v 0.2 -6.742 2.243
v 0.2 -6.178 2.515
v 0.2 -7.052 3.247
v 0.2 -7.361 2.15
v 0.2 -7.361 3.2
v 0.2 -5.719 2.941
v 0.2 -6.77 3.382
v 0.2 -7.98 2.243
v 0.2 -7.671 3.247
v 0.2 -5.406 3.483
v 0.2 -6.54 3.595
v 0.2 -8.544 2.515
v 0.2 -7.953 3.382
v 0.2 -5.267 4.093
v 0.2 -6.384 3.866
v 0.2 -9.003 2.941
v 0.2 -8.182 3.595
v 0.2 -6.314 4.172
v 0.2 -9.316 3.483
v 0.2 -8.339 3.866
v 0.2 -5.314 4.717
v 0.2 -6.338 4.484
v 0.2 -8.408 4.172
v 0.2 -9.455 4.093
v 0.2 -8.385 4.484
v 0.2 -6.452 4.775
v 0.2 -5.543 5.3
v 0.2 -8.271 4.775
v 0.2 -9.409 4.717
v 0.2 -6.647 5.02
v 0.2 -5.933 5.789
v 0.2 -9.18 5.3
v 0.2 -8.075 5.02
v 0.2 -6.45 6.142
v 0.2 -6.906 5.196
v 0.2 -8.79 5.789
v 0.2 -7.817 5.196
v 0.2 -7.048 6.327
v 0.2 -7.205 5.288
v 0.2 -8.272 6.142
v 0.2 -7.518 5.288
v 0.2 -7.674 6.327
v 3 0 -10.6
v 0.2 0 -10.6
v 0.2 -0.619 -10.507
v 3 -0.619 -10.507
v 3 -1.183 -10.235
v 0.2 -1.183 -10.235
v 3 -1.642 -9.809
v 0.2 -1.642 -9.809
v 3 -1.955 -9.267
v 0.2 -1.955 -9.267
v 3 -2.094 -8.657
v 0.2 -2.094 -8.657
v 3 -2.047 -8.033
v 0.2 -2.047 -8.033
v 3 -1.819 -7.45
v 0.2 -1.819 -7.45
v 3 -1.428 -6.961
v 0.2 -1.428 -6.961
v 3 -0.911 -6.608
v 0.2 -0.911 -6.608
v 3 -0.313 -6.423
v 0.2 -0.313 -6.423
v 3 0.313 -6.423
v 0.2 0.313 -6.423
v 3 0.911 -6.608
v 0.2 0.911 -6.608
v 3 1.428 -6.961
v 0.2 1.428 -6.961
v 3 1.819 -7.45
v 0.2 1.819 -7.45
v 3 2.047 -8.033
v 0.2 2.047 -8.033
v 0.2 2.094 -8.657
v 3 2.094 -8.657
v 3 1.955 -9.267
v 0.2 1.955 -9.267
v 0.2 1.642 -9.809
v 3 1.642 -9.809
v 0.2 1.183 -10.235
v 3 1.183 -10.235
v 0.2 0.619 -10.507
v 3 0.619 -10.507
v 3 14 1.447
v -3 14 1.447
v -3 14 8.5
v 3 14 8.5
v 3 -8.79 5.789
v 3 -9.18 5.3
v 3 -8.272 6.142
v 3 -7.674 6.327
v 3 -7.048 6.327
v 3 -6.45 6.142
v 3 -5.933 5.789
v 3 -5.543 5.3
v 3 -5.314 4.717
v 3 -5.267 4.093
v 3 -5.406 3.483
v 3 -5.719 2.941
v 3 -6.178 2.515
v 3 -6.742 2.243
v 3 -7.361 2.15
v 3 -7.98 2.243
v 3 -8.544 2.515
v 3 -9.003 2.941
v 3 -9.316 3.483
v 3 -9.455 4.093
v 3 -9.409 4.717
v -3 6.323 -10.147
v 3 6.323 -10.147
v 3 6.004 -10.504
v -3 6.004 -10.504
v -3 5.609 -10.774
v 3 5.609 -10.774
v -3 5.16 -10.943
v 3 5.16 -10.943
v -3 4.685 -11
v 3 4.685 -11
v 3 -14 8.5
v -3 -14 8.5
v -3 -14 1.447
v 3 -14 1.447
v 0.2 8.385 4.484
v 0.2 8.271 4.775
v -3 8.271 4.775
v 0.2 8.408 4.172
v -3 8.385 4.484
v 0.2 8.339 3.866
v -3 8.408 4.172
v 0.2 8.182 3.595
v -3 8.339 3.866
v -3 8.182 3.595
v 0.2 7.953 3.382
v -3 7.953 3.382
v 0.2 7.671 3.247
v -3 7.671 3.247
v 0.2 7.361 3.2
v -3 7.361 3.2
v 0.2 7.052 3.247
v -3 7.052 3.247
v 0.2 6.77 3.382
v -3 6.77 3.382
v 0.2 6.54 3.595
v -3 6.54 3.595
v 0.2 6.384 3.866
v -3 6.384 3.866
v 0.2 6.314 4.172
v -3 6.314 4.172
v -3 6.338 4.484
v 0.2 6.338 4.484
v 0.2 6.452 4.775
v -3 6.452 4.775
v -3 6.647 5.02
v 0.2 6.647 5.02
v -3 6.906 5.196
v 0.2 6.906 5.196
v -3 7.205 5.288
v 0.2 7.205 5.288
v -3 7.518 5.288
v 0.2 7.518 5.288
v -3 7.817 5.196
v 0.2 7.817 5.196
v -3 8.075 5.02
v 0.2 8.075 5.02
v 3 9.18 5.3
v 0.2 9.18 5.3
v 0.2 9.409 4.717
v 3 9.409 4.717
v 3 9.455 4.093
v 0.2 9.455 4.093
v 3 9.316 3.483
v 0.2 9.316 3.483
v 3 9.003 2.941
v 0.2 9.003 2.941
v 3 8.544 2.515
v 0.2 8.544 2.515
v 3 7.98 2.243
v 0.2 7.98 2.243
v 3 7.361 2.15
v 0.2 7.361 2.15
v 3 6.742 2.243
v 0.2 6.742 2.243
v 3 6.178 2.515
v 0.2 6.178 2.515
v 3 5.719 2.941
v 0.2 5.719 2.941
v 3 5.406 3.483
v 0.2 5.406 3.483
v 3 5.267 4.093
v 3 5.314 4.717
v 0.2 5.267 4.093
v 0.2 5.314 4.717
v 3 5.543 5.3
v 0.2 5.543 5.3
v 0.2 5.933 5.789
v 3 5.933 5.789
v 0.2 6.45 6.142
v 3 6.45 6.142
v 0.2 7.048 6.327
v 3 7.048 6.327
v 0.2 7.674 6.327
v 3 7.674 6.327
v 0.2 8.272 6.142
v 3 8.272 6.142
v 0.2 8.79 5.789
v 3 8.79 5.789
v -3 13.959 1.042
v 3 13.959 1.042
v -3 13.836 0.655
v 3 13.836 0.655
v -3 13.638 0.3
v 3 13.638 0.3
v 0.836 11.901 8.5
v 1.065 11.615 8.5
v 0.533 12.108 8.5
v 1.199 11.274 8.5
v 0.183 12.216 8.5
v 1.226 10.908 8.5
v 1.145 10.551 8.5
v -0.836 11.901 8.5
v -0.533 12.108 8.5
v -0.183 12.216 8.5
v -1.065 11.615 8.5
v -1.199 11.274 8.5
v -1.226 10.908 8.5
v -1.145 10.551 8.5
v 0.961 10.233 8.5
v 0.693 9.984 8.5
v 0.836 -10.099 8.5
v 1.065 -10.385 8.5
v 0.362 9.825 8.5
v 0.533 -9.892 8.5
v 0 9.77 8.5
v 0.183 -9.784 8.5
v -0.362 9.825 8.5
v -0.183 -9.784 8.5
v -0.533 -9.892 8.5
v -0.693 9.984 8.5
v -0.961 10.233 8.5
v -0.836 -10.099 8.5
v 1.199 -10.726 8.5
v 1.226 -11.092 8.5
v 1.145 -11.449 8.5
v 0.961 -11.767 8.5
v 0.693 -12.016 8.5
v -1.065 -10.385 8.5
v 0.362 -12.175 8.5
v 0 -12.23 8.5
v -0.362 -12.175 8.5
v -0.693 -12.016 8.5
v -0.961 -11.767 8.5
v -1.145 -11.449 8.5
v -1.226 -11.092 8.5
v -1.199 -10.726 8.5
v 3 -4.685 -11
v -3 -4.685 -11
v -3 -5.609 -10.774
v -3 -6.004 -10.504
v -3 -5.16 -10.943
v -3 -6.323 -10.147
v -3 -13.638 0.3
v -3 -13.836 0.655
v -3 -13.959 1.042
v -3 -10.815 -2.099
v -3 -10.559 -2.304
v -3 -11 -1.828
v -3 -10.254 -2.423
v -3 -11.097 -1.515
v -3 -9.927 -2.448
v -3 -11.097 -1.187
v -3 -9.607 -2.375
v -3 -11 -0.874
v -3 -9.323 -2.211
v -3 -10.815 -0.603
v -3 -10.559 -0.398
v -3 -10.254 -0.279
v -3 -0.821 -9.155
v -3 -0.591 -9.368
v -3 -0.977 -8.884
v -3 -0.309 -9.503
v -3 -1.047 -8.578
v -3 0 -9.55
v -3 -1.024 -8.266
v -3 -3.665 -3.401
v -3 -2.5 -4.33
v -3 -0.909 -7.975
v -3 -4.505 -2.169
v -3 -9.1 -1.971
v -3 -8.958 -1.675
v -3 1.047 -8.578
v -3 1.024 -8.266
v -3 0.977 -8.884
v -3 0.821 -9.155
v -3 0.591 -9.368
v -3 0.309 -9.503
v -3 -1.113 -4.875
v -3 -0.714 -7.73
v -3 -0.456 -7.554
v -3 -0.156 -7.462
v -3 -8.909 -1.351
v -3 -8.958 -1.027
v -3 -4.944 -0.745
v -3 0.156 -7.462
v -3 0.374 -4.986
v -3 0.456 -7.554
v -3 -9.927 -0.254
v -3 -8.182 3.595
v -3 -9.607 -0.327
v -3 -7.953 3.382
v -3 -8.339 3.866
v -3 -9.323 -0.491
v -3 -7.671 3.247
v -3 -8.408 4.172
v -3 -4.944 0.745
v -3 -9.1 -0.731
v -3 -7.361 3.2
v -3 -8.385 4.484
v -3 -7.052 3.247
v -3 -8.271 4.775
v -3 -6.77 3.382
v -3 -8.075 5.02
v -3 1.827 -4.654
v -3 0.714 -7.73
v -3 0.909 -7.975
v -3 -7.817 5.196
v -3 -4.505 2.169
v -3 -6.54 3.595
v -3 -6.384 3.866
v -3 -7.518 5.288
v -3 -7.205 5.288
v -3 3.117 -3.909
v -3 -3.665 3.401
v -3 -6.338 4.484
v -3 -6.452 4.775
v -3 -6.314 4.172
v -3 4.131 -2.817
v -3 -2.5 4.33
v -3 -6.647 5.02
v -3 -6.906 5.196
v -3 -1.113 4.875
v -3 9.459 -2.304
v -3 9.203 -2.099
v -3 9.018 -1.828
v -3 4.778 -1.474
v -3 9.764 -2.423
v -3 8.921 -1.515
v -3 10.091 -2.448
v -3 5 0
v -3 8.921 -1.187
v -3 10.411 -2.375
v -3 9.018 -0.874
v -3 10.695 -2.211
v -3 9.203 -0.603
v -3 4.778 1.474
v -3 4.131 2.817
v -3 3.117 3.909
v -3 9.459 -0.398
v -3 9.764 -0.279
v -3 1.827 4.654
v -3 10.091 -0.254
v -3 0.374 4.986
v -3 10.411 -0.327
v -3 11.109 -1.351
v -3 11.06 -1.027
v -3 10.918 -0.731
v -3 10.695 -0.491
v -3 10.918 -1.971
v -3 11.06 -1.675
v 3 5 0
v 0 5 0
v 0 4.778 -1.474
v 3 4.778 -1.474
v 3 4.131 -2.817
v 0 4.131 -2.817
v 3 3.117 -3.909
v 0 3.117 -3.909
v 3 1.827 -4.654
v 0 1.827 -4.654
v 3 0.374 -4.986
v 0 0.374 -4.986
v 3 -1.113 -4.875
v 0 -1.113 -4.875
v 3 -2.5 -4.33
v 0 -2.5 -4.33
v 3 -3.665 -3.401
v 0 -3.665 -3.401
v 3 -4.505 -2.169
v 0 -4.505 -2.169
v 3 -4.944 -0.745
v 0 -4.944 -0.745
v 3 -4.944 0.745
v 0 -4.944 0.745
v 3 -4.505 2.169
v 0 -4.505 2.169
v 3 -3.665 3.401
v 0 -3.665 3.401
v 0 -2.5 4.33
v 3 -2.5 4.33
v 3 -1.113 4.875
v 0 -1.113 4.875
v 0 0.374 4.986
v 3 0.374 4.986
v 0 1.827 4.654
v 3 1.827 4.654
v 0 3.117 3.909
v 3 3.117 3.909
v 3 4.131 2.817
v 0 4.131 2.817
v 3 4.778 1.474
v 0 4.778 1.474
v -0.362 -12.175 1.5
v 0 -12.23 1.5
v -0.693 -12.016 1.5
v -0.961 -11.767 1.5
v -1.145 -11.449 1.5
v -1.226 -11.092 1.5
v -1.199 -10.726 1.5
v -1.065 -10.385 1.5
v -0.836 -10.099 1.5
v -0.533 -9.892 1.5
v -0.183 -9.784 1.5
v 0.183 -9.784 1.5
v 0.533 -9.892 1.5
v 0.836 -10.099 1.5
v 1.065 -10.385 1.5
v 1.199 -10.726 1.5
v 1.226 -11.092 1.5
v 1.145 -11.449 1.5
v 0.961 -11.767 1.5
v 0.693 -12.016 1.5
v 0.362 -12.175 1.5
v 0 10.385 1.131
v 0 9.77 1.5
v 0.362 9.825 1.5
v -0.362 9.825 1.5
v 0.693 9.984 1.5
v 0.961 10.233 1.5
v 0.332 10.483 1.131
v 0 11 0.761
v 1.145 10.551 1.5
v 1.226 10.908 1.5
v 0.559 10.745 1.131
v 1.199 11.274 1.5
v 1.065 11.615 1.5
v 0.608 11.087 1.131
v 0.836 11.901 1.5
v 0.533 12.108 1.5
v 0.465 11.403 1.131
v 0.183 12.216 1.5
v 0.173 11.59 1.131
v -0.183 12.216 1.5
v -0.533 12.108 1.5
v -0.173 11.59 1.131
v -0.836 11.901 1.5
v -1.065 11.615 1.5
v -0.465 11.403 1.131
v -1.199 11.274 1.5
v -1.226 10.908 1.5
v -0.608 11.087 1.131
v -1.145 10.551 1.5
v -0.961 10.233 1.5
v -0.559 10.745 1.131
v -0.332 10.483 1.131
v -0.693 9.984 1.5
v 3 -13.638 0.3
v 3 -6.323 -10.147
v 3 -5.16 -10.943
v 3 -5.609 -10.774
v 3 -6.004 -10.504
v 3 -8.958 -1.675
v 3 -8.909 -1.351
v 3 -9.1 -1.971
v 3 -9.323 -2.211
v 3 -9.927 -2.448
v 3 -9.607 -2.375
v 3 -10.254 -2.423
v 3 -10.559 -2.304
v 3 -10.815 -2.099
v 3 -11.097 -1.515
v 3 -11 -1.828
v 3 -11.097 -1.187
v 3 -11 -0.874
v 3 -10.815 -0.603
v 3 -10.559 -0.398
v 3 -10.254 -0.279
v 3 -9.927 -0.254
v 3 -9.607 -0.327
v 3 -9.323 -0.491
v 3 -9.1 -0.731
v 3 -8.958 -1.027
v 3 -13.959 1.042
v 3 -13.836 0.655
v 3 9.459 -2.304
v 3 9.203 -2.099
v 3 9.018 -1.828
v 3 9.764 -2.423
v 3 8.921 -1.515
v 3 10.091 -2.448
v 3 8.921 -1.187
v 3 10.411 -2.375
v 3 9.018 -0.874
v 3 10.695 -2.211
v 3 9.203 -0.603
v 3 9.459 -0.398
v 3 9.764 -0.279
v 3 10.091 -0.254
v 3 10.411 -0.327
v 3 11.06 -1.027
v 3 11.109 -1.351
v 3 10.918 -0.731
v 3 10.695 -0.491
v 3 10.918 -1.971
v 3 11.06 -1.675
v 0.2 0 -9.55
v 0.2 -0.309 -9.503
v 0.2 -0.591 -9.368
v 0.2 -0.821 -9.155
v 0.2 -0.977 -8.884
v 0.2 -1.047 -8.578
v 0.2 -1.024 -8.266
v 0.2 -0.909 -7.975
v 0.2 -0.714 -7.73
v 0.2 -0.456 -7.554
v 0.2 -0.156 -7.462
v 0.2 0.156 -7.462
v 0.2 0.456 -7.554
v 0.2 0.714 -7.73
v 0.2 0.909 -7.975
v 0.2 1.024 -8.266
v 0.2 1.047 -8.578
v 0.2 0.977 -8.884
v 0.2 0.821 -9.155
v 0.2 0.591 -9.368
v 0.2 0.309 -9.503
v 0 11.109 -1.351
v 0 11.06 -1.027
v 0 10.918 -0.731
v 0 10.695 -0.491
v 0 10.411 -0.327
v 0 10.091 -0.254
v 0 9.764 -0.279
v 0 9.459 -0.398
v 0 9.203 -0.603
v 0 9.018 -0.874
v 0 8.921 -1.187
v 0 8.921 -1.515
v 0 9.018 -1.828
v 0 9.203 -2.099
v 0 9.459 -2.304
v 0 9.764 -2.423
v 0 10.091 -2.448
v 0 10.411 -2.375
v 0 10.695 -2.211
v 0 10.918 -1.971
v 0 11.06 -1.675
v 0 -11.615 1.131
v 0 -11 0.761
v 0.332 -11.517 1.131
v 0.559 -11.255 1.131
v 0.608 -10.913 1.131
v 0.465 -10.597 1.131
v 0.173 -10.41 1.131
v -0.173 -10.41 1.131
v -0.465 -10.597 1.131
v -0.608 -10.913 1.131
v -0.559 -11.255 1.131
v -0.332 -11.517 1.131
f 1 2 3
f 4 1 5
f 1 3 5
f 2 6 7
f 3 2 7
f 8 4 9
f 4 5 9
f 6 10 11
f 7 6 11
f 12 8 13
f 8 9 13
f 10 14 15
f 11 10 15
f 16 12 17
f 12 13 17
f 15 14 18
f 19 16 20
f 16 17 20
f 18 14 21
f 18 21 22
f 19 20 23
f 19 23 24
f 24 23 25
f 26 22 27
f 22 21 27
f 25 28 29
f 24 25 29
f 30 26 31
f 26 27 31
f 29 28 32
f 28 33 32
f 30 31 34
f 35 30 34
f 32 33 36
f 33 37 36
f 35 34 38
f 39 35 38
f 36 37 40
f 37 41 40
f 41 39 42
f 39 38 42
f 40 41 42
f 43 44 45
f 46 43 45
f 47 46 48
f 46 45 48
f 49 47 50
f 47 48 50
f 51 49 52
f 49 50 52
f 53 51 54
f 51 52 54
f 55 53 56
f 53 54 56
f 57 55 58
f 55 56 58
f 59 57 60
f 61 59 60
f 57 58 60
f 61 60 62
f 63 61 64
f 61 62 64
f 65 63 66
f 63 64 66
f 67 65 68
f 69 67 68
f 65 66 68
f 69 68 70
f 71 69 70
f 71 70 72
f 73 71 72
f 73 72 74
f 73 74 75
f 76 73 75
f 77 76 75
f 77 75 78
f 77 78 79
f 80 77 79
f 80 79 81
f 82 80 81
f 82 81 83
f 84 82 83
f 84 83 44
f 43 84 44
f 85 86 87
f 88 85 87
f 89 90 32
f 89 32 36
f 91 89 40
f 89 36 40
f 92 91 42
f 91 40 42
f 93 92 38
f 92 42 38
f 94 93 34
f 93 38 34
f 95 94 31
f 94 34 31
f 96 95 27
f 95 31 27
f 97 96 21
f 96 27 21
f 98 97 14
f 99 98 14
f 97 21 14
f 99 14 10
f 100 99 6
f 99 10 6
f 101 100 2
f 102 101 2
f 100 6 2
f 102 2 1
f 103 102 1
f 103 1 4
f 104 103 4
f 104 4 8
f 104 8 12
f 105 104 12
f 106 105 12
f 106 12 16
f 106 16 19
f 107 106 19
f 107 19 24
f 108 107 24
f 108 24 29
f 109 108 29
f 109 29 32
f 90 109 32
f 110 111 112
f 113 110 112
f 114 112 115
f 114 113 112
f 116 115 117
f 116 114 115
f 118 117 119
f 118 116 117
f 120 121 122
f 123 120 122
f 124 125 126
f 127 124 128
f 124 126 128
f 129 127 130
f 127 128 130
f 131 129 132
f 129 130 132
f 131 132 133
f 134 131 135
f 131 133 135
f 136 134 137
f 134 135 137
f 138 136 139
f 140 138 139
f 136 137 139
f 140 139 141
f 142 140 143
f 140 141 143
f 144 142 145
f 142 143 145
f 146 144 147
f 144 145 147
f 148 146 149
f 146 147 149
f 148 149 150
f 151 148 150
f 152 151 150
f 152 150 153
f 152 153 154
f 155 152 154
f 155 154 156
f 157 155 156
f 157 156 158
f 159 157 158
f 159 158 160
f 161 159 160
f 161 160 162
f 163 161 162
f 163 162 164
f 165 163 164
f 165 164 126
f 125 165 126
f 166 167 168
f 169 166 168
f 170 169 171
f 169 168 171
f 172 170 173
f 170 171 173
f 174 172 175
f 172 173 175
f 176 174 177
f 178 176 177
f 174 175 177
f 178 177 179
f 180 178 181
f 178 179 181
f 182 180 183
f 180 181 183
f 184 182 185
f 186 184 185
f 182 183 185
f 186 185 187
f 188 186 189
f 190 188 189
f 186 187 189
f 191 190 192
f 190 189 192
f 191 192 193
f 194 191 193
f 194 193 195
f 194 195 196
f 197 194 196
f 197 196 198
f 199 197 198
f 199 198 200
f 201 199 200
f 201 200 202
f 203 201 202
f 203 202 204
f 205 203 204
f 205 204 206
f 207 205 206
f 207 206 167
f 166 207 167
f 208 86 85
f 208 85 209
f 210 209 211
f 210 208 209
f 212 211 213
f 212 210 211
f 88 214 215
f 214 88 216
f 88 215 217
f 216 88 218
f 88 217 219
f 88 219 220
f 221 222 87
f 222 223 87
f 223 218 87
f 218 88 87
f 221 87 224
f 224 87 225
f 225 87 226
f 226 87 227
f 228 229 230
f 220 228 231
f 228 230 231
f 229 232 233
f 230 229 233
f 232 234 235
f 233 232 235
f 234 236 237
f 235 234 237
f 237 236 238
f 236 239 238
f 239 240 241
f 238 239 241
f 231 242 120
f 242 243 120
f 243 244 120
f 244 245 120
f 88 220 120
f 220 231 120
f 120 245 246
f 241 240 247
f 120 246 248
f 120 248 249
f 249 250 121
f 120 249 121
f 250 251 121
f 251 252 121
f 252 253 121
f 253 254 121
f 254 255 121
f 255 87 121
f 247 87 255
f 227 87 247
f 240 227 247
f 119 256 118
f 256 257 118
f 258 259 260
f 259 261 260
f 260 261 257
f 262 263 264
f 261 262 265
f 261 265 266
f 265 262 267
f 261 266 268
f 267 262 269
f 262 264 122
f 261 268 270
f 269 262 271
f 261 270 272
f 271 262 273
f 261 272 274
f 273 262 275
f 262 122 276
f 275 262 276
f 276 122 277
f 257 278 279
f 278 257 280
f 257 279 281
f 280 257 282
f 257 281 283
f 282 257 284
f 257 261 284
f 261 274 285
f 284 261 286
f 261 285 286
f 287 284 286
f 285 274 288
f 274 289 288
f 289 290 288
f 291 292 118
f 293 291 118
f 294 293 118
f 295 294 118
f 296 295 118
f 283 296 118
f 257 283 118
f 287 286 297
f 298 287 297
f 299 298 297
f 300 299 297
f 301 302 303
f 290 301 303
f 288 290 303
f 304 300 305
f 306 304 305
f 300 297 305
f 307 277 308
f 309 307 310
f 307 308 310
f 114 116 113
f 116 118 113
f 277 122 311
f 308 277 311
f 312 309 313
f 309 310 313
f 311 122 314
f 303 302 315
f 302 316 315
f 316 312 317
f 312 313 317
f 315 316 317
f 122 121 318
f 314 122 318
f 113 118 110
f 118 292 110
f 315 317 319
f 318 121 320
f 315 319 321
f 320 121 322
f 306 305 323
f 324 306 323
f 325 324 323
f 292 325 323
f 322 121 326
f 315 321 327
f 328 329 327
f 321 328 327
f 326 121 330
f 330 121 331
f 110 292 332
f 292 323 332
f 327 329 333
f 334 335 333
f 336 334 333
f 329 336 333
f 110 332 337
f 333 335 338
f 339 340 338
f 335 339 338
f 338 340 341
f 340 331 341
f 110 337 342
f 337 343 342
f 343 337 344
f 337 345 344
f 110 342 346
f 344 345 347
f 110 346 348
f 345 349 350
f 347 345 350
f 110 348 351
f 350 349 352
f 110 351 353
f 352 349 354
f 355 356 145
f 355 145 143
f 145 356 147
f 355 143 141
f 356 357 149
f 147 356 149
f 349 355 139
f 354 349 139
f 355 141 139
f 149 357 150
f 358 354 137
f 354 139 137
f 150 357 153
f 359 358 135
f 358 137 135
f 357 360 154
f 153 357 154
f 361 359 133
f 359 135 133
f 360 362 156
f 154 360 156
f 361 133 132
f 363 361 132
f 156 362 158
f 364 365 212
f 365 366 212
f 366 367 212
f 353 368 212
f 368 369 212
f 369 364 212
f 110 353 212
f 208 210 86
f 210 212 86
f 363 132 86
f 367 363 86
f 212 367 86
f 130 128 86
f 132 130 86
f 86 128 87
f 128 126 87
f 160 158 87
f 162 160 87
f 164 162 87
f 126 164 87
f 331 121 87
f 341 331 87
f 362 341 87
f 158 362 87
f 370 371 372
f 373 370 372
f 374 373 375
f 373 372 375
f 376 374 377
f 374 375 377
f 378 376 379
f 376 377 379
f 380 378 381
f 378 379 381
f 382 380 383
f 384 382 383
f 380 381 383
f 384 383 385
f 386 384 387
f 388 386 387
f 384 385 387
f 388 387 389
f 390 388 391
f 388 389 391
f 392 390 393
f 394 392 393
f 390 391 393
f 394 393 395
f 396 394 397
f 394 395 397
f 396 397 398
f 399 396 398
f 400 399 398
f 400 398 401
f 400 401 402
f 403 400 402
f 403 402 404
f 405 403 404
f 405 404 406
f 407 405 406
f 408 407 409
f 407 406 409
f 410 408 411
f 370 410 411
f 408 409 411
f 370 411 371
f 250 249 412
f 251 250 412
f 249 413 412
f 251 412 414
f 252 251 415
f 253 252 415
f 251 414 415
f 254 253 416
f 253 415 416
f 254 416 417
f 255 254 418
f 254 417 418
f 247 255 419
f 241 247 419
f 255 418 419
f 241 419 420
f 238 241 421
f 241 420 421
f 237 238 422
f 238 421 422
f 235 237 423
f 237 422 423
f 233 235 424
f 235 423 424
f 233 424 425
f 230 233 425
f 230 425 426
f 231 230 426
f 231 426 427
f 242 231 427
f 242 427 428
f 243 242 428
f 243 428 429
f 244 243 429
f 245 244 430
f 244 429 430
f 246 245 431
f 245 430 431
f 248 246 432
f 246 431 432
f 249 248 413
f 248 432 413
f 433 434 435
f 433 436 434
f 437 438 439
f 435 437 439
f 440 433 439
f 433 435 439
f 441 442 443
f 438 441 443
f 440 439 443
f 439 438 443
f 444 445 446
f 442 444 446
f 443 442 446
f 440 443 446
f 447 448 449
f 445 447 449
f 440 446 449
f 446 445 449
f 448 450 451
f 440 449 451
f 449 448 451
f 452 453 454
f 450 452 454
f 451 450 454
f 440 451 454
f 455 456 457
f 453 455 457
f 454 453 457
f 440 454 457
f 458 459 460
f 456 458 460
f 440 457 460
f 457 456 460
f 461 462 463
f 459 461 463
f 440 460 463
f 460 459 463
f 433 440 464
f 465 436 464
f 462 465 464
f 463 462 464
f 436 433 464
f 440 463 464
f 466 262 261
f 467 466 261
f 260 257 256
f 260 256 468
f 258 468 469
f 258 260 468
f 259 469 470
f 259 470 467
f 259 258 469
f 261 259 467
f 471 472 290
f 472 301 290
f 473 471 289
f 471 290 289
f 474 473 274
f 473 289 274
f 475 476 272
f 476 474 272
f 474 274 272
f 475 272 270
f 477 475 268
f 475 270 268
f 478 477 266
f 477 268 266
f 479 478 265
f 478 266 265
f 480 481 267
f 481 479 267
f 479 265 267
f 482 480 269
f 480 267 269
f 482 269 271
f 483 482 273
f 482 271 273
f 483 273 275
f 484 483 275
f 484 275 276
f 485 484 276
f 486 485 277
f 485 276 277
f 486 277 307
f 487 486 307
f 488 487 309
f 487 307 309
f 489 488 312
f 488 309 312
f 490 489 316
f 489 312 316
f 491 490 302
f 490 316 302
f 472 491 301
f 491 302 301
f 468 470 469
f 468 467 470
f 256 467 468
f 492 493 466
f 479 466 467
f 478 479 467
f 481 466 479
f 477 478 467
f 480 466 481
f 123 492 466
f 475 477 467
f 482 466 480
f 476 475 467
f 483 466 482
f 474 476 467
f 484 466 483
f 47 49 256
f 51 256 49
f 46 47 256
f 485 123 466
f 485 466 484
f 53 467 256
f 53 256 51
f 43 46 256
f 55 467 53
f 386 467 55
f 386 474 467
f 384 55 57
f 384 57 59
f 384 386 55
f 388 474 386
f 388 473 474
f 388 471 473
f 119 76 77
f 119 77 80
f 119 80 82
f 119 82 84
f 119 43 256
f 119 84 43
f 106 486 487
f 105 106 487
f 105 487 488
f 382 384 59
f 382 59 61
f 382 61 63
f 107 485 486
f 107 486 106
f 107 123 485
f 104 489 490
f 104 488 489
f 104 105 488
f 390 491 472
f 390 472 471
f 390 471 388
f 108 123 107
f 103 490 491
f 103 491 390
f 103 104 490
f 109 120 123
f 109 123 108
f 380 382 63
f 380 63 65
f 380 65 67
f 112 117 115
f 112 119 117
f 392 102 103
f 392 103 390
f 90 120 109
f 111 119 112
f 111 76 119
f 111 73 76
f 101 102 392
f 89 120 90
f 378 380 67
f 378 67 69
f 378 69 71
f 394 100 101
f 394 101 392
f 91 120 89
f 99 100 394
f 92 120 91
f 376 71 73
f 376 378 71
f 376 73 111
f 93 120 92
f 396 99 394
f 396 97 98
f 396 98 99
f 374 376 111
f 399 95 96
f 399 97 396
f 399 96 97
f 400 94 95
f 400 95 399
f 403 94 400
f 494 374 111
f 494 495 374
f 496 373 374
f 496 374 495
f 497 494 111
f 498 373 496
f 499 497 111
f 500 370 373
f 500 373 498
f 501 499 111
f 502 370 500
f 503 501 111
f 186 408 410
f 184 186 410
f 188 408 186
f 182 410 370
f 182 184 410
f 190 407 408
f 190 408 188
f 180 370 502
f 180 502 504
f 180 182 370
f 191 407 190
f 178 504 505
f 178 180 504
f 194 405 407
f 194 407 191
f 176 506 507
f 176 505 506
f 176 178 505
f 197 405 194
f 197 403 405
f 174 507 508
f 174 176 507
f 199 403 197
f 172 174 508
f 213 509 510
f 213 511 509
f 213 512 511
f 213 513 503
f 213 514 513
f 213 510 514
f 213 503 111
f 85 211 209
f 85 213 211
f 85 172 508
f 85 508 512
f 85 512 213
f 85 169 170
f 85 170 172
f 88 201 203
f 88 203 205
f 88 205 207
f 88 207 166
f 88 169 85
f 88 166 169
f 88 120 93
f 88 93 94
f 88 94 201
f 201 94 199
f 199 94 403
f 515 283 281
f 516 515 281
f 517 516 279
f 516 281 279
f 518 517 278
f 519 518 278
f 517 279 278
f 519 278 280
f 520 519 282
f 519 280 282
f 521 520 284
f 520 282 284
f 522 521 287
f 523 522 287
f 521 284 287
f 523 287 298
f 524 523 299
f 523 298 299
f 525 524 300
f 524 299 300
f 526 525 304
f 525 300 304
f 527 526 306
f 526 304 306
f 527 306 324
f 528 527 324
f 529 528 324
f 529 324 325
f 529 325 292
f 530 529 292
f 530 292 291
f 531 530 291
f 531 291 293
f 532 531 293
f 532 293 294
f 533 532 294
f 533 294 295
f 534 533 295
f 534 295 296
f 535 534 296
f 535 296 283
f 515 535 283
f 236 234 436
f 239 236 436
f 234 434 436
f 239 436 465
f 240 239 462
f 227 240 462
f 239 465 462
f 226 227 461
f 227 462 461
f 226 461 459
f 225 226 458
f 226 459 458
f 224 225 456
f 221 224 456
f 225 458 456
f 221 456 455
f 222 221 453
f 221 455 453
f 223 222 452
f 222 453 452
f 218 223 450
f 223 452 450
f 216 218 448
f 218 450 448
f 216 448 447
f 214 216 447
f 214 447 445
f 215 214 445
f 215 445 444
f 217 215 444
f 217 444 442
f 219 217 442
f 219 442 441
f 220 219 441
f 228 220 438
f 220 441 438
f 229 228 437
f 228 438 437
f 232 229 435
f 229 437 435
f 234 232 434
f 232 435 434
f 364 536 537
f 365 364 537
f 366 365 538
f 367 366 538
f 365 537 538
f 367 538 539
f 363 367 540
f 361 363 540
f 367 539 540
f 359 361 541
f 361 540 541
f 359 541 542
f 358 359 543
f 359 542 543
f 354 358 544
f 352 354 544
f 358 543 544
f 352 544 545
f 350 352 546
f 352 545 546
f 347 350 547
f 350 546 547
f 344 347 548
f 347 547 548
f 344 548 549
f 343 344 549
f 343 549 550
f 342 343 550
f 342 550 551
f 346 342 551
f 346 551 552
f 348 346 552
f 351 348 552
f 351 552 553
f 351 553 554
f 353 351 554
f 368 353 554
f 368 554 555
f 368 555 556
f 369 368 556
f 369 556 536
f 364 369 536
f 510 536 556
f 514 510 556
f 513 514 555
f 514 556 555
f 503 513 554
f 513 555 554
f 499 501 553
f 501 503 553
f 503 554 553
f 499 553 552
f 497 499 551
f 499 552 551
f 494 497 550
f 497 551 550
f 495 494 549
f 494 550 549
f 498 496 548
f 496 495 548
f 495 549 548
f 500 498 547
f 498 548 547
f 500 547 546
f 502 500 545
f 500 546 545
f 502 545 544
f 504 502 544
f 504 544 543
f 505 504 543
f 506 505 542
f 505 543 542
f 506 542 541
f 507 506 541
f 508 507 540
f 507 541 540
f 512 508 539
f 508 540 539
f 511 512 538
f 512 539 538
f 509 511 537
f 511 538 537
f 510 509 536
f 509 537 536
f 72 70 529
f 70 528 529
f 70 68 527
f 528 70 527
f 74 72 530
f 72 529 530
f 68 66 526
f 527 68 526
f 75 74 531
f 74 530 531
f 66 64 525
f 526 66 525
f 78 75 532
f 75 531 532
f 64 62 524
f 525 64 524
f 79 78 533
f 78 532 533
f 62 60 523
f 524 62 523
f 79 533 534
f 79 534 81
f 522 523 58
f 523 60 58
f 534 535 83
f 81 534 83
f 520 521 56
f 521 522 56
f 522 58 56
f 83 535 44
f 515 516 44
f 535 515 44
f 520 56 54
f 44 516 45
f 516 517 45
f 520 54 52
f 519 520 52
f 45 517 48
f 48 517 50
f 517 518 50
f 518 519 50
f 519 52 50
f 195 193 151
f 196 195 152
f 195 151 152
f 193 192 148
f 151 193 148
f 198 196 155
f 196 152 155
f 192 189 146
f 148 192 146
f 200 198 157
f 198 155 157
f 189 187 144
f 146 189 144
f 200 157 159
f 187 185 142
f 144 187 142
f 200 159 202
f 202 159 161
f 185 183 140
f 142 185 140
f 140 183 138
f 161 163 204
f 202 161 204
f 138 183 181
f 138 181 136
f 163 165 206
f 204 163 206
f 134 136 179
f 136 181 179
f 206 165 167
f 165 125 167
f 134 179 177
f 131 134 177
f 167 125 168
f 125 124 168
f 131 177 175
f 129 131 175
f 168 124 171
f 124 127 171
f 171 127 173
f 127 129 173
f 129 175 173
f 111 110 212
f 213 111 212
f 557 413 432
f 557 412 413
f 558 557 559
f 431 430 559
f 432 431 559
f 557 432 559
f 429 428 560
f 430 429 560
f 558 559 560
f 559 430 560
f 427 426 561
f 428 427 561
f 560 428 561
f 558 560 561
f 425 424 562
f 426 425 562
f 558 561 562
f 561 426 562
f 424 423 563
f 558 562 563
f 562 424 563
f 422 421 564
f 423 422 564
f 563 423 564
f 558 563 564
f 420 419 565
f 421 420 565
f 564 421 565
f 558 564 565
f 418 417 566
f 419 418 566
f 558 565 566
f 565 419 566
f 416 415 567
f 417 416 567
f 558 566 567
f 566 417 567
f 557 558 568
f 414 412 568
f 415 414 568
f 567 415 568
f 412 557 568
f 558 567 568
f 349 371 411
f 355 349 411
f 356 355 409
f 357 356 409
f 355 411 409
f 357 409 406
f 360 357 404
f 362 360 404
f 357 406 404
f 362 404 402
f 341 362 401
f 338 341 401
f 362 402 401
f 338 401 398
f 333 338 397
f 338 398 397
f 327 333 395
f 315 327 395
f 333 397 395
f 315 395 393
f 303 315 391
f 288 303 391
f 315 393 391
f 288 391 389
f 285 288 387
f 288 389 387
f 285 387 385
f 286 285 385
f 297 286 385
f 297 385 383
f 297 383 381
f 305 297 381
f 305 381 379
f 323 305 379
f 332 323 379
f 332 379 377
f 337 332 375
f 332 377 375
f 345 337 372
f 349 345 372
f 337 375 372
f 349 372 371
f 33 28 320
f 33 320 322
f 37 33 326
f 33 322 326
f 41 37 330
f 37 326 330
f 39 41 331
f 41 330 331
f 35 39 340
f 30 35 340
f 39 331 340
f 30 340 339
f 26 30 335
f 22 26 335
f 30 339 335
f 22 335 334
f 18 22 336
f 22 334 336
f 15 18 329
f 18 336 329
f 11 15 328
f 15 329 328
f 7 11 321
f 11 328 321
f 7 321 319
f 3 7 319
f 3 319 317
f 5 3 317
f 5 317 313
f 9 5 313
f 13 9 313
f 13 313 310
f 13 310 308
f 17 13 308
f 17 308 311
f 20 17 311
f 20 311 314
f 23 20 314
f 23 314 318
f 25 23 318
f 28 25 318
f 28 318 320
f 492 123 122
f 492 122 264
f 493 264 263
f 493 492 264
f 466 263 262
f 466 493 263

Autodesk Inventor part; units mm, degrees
ref_plane "YZ Plane" through (0, 0, 0) normal (1, 0, 0) x (0, 1, 0)
ref_plane "XZ Plane" through (0, 0, 0) normal (0, 1, 0) x (-1, 0, 0)
ref_plane "XY Plane" through (0, 0, 0) normal (0, 0, 1) x (1, 0, 0)
sketch "Skizze1" plane through (0, 0, 0) normal (1, 0, 0) x (0, 1, 0)
  arc A0 (-6.9821, 8.5) -> (6.9821, 8.5) centre (0, 0) ccw construction
  line L0 (14, 8.5) -> (-14, 8.5)
  line L1 (-14, 8.5) -> (-14, 0.8162)
  line L2 (0, 12.4) -> (0, -14.9) projected
  circle A1 centre (0, 0) radius 5
  line L3 (14, 0.8162) -> (14, 8.5)
  line L4 (-14, 0.8162) -> (-5.7262, -11)
  line L5 (-5.7262, -11) -> (5.7262, -11)
  line L6 (5.7262, -11) -> (14, 0.8162)
  circle A2 centre (10.009, -1.351) radius 1.1
  circle A3 centre (-10.009, -1.351) radius 1.1
  dimension "d0" = 22
  dimension "d2" = 10
  dimension "d19" = 8.5
  dimension "d39" = 14
  dimension "d50" = 2.2
  dimension "d57" = 10.009
  dimension "d58" = 1.351
  dimension "d59" = 35
extrude "Extrusion1" add sketch "Skizze1" along normal mid plane 6 contours L3 L6 L5 L2 A1 L0 | L2 A1 L5 L4 L1 L0
sketch "Skizze2" plane through (3, 0, 0) normal (1, 0, 0) x (0, 0, -1)
  circle A0 centre (0, 0) radius 8.5 construction
  line L0 (0, 0) -> (8.5, 0) construction
  line L1 (-12.4, 0) -> (14.9, 0) projected
  dimension "d6" = 17
hole "Bohrung1" at (3, 0, -8.5) direction (-1, 0, 0) diameter 2.1 end through all counterbore diameter 4.2 counterbore depth 2.8
pattern_circular "Runde Anordnung1" count 3 over 360 about axis through (0, 0, 0) along (1, 0, 0) of "Bohrung1"
sketch "Skizze3" plane through (-3, -14, 8.5) normal (0, 0, 1) x (1, 0, 0)
  line L0 (0, 0) -> (6, 0) projected
  line L1 (6, 28) -> (6, 0) projected
  line L2 (0, 0) -> (0, 28) projected
  line L3 (0, 0) -> (6, 0) construction
  line L4 (3, 0) -> (3, 24.0467) construction
  line L5 (6, 28) -> (0, 28) projected
  line L6 (-1.2, 14) -> (7.2, 14) projected
  point P0 (3, 14)
  point P1 (3, 3)
  point P2 (3, 25)
  dimension "d44" = 11
hole "Bohrung2" at (0, -11, 8.5) at (0, 11, 8.5) direction (0, 0, -1) diameter 2.459 depth 7 tip angle 118 thread size "M3x0.5" class "6H" standard "ISO Metric profile"
sketch "Skizze5" plane through (3, 0, 0) normal (1, 0, 0) x (0, 0, -1)
  circle A0 centre (0, 0) radius 6.5
  dimension "d41" = 13
extrude "Extrusion2" [suppressed]
chamfer "Fase1" [suppressed]
fillet "Rundung2" radius 2 4 edges at (0, -5.7262, -11) (0, 5.7262, -11) (0, -14, 0.8162) (0, 14, 0.8162)
fillet "Rundung1" [suppressed]
properties part number "Motorhalter" material "Aluminium 6061"
